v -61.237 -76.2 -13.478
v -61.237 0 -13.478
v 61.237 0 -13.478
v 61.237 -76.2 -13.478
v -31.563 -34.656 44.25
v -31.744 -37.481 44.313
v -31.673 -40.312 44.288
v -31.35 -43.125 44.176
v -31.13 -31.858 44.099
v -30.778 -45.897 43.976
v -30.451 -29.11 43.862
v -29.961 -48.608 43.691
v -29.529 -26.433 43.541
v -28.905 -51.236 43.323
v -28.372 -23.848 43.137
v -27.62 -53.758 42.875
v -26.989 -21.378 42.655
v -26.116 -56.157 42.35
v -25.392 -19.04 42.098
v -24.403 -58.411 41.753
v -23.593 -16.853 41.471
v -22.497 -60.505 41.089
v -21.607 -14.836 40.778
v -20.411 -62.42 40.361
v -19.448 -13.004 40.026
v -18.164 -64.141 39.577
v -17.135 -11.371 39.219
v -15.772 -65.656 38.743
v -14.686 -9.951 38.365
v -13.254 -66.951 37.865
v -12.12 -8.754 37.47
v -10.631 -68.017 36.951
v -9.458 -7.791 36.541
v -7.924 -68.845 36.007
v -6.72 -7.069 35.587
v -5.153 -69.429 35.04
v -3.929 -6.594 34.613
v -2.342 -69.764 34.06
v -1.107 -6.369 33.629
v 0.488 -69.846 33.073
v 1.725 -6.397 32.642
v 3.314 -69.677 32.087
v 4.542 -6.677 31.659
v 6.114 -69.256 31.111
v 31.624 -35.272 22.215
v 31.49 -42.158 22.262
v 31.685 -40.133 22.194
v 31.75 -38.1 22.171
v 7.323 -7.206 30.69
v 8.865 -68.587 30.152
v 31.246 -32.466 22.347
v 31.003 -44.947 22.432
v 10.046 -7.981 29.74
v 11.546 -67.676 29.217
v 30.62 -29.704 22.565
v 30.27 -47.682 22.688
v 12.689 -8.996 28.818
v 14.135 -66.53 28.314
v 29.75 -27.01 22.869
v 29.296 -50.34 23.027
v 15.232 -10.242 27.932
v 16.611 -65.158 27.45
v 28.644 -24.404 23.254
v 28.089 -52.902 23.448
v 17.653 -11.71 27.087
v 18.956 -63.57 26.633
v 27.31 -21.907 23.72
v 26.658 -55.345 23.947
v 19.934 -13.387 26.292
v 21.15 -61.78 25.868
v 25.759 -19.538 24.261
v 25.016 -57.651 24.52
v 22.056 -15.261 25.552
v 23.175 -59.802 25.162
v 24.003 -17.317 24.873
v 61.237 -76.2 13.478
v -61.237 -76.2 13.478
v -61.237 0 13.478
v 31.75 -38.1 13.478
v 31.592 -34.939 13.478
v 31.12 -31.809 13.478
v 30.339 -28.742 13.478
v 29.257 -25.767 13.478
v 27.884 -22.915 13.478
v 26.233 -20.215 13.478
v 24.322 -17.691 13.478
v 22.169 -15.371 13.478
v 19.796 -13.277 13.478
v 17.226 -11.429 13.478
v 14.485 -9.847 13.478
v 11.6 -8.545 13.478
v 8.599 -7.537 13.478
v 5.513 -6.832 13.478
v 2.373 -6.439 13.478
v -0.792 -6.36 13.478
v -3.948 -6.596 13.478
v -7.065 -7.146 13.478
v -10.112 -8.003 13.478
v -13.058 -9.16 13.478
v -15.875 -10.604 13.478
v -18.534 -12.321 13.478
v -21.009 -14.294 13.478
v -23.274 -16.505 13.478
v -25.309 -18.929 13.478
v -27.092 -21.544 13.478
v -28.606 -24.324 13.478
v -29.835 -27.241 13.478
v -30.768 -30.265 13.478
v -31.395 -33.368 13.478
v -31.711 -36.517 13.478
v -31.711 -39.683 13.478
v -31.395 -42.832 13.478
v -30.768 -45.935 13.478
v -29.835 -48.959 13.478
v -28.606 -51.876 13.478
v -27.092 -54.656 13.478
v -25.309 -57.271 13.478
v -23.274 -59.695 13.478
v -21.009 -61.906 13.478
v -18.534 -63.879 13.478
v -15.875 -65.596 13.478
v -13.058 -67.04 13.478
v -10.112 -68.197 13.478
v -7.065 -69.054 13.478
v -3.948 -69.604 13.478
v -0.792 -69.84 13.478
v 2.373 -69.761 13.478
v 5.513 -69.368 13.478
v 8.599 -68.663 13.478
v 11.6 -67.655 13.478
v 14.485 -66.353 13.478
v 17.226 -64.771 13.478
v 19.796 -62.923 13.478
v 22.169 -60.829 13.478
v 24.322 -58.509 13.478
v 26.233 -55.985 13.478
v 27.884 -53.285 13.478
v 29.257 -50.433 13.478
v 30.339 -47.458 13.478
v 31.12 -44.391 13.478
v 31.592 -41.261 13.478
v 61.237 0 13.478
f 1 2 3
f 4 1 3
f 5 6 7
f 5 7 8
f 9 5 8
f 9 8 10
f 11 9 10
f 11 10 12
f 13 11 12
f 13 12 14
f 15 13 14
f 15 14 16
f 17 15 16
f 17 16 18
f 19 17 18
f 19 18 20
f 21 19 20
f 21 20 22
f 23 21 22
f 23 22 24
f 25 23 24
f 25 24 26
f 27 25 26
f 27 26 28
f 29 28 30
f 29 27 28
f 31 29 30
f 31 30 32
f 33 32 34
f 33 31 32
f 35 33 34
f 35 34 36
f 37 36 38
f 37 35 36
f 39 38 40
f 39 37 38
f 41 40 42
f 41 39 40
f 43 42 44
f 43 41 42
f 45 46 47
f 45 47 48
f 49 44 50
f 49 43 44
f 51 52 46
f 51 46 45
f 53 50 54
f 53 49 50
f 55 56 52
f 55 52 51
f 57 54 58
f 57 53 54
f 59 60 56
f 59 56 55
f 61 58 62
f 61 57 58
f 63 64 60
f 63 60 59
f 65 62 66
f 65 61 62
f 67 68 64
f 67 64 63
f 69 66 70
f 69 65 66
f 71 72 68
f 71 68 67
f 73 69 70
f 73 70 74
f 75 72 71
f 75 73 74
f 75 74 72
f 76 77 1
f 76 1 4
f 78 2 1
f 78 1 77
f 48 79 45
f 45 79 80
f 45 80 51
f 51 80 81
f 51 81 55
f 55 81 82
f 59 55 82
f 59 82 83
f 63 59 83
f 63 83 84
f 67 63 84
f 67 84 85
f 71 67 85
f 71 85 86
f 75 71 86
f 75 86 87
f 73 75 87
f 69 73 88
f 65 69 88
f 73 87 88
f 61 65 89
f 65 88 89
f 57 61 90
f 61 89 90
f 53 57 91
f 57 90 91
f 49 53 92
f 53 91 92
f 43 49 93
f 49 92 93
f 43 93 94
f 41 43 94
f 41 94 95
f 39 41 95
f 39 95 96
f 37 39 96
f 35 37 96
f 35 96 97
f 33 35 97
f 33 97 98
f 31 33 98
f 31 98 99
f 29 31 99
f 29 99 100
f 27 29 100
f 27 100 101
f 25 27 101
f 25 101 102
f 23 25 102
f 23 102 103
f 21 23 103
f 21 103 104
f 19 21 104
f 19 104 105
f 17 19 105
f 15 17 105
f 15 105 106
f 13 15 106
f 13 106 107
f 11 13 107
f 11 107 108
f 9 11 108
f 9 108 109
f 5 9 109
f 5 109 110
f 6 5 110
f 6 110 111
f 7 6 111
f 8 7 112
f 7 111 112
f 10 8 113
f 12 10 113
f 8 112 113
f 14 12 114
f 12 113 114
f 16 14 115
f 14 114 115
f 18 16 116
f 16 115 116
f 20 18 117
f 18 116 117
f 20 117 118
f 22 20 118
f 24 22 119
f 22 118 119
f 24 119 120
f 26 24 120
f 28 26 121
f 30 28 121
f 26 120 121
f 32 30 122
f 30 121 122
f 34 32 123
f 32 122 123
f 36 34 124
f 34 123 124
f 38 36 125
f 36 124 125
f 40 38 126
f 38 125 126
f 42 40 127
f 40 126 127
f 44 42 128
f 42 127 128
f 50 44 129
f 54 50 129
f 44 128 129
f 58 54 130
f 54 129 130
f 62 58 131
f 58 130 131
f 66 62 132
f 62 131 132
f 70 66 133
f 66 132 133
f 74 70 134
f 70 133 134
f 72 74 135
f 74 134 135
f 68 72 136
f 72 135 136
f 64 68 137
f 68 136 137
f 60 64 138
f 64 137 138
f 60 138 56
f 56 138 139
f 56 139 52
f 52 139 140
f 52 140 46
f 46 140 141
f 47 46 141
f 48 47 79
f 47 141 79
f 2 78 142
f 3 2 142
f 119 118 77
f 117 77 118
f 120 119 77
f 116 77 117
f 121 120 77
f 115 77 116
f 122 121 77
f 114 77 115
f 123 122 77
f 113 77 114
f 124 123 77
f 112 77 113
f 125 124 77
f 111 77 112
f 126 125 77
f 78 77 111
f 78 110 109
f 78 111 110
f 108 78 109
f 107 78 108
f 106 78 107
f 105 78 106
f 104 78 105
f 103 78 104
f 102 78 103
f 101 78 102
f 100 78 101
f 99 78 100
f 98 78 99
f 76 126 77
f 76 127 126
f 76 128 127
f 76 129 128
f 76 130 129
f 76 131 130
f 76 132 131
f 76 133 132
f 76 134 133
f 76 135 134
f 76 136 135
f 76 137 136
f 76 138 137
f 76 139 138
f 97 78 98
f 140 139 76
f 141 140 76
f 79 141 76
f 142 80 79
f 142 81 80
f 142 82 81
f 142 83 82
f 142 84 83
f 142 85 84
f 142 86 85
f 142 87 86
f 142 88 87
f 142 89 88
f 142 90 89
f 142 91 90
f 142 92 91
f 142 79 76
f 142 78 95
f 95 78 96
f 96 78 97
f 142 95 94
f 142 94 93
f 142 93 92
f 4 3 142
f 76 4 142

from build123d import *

# Parameters (mm, degrees)
F0_W     = 122.473546
F0_H     = 26.955904
F1_DEPTH = 76.2
F2_R     = 31.75
F3_DEPTH = 38.1
F5_DEPTH = 92.71


with BuildPart() as f1:
    # F0 (on Front) → F1 (new body)
    with BuildSketch(Plane.XZ):
        Rectangle(F0_W, F0_H)
    extrude(amount=F1_DEPTH)

    # F2 (on face) → F3 (join)
    with BuildSketch(Plane.XY.offset(13.477952)):
        with Locations((0, -38.1)):
            Circle(F2_R)
    extrude(amount=F3_DEPTH)

    # F4 (on Front) → F5 (cut)
    with BuildSketch(Plane.XZ):
        Polygon((38.983259, 69.250525), (-120.331847, 75.206235), (38.983259, 19.648822), align=None)
    extrude(amount=F5_DEPTH, mode=Mode.SUBTRACT)


solid = f1.part
